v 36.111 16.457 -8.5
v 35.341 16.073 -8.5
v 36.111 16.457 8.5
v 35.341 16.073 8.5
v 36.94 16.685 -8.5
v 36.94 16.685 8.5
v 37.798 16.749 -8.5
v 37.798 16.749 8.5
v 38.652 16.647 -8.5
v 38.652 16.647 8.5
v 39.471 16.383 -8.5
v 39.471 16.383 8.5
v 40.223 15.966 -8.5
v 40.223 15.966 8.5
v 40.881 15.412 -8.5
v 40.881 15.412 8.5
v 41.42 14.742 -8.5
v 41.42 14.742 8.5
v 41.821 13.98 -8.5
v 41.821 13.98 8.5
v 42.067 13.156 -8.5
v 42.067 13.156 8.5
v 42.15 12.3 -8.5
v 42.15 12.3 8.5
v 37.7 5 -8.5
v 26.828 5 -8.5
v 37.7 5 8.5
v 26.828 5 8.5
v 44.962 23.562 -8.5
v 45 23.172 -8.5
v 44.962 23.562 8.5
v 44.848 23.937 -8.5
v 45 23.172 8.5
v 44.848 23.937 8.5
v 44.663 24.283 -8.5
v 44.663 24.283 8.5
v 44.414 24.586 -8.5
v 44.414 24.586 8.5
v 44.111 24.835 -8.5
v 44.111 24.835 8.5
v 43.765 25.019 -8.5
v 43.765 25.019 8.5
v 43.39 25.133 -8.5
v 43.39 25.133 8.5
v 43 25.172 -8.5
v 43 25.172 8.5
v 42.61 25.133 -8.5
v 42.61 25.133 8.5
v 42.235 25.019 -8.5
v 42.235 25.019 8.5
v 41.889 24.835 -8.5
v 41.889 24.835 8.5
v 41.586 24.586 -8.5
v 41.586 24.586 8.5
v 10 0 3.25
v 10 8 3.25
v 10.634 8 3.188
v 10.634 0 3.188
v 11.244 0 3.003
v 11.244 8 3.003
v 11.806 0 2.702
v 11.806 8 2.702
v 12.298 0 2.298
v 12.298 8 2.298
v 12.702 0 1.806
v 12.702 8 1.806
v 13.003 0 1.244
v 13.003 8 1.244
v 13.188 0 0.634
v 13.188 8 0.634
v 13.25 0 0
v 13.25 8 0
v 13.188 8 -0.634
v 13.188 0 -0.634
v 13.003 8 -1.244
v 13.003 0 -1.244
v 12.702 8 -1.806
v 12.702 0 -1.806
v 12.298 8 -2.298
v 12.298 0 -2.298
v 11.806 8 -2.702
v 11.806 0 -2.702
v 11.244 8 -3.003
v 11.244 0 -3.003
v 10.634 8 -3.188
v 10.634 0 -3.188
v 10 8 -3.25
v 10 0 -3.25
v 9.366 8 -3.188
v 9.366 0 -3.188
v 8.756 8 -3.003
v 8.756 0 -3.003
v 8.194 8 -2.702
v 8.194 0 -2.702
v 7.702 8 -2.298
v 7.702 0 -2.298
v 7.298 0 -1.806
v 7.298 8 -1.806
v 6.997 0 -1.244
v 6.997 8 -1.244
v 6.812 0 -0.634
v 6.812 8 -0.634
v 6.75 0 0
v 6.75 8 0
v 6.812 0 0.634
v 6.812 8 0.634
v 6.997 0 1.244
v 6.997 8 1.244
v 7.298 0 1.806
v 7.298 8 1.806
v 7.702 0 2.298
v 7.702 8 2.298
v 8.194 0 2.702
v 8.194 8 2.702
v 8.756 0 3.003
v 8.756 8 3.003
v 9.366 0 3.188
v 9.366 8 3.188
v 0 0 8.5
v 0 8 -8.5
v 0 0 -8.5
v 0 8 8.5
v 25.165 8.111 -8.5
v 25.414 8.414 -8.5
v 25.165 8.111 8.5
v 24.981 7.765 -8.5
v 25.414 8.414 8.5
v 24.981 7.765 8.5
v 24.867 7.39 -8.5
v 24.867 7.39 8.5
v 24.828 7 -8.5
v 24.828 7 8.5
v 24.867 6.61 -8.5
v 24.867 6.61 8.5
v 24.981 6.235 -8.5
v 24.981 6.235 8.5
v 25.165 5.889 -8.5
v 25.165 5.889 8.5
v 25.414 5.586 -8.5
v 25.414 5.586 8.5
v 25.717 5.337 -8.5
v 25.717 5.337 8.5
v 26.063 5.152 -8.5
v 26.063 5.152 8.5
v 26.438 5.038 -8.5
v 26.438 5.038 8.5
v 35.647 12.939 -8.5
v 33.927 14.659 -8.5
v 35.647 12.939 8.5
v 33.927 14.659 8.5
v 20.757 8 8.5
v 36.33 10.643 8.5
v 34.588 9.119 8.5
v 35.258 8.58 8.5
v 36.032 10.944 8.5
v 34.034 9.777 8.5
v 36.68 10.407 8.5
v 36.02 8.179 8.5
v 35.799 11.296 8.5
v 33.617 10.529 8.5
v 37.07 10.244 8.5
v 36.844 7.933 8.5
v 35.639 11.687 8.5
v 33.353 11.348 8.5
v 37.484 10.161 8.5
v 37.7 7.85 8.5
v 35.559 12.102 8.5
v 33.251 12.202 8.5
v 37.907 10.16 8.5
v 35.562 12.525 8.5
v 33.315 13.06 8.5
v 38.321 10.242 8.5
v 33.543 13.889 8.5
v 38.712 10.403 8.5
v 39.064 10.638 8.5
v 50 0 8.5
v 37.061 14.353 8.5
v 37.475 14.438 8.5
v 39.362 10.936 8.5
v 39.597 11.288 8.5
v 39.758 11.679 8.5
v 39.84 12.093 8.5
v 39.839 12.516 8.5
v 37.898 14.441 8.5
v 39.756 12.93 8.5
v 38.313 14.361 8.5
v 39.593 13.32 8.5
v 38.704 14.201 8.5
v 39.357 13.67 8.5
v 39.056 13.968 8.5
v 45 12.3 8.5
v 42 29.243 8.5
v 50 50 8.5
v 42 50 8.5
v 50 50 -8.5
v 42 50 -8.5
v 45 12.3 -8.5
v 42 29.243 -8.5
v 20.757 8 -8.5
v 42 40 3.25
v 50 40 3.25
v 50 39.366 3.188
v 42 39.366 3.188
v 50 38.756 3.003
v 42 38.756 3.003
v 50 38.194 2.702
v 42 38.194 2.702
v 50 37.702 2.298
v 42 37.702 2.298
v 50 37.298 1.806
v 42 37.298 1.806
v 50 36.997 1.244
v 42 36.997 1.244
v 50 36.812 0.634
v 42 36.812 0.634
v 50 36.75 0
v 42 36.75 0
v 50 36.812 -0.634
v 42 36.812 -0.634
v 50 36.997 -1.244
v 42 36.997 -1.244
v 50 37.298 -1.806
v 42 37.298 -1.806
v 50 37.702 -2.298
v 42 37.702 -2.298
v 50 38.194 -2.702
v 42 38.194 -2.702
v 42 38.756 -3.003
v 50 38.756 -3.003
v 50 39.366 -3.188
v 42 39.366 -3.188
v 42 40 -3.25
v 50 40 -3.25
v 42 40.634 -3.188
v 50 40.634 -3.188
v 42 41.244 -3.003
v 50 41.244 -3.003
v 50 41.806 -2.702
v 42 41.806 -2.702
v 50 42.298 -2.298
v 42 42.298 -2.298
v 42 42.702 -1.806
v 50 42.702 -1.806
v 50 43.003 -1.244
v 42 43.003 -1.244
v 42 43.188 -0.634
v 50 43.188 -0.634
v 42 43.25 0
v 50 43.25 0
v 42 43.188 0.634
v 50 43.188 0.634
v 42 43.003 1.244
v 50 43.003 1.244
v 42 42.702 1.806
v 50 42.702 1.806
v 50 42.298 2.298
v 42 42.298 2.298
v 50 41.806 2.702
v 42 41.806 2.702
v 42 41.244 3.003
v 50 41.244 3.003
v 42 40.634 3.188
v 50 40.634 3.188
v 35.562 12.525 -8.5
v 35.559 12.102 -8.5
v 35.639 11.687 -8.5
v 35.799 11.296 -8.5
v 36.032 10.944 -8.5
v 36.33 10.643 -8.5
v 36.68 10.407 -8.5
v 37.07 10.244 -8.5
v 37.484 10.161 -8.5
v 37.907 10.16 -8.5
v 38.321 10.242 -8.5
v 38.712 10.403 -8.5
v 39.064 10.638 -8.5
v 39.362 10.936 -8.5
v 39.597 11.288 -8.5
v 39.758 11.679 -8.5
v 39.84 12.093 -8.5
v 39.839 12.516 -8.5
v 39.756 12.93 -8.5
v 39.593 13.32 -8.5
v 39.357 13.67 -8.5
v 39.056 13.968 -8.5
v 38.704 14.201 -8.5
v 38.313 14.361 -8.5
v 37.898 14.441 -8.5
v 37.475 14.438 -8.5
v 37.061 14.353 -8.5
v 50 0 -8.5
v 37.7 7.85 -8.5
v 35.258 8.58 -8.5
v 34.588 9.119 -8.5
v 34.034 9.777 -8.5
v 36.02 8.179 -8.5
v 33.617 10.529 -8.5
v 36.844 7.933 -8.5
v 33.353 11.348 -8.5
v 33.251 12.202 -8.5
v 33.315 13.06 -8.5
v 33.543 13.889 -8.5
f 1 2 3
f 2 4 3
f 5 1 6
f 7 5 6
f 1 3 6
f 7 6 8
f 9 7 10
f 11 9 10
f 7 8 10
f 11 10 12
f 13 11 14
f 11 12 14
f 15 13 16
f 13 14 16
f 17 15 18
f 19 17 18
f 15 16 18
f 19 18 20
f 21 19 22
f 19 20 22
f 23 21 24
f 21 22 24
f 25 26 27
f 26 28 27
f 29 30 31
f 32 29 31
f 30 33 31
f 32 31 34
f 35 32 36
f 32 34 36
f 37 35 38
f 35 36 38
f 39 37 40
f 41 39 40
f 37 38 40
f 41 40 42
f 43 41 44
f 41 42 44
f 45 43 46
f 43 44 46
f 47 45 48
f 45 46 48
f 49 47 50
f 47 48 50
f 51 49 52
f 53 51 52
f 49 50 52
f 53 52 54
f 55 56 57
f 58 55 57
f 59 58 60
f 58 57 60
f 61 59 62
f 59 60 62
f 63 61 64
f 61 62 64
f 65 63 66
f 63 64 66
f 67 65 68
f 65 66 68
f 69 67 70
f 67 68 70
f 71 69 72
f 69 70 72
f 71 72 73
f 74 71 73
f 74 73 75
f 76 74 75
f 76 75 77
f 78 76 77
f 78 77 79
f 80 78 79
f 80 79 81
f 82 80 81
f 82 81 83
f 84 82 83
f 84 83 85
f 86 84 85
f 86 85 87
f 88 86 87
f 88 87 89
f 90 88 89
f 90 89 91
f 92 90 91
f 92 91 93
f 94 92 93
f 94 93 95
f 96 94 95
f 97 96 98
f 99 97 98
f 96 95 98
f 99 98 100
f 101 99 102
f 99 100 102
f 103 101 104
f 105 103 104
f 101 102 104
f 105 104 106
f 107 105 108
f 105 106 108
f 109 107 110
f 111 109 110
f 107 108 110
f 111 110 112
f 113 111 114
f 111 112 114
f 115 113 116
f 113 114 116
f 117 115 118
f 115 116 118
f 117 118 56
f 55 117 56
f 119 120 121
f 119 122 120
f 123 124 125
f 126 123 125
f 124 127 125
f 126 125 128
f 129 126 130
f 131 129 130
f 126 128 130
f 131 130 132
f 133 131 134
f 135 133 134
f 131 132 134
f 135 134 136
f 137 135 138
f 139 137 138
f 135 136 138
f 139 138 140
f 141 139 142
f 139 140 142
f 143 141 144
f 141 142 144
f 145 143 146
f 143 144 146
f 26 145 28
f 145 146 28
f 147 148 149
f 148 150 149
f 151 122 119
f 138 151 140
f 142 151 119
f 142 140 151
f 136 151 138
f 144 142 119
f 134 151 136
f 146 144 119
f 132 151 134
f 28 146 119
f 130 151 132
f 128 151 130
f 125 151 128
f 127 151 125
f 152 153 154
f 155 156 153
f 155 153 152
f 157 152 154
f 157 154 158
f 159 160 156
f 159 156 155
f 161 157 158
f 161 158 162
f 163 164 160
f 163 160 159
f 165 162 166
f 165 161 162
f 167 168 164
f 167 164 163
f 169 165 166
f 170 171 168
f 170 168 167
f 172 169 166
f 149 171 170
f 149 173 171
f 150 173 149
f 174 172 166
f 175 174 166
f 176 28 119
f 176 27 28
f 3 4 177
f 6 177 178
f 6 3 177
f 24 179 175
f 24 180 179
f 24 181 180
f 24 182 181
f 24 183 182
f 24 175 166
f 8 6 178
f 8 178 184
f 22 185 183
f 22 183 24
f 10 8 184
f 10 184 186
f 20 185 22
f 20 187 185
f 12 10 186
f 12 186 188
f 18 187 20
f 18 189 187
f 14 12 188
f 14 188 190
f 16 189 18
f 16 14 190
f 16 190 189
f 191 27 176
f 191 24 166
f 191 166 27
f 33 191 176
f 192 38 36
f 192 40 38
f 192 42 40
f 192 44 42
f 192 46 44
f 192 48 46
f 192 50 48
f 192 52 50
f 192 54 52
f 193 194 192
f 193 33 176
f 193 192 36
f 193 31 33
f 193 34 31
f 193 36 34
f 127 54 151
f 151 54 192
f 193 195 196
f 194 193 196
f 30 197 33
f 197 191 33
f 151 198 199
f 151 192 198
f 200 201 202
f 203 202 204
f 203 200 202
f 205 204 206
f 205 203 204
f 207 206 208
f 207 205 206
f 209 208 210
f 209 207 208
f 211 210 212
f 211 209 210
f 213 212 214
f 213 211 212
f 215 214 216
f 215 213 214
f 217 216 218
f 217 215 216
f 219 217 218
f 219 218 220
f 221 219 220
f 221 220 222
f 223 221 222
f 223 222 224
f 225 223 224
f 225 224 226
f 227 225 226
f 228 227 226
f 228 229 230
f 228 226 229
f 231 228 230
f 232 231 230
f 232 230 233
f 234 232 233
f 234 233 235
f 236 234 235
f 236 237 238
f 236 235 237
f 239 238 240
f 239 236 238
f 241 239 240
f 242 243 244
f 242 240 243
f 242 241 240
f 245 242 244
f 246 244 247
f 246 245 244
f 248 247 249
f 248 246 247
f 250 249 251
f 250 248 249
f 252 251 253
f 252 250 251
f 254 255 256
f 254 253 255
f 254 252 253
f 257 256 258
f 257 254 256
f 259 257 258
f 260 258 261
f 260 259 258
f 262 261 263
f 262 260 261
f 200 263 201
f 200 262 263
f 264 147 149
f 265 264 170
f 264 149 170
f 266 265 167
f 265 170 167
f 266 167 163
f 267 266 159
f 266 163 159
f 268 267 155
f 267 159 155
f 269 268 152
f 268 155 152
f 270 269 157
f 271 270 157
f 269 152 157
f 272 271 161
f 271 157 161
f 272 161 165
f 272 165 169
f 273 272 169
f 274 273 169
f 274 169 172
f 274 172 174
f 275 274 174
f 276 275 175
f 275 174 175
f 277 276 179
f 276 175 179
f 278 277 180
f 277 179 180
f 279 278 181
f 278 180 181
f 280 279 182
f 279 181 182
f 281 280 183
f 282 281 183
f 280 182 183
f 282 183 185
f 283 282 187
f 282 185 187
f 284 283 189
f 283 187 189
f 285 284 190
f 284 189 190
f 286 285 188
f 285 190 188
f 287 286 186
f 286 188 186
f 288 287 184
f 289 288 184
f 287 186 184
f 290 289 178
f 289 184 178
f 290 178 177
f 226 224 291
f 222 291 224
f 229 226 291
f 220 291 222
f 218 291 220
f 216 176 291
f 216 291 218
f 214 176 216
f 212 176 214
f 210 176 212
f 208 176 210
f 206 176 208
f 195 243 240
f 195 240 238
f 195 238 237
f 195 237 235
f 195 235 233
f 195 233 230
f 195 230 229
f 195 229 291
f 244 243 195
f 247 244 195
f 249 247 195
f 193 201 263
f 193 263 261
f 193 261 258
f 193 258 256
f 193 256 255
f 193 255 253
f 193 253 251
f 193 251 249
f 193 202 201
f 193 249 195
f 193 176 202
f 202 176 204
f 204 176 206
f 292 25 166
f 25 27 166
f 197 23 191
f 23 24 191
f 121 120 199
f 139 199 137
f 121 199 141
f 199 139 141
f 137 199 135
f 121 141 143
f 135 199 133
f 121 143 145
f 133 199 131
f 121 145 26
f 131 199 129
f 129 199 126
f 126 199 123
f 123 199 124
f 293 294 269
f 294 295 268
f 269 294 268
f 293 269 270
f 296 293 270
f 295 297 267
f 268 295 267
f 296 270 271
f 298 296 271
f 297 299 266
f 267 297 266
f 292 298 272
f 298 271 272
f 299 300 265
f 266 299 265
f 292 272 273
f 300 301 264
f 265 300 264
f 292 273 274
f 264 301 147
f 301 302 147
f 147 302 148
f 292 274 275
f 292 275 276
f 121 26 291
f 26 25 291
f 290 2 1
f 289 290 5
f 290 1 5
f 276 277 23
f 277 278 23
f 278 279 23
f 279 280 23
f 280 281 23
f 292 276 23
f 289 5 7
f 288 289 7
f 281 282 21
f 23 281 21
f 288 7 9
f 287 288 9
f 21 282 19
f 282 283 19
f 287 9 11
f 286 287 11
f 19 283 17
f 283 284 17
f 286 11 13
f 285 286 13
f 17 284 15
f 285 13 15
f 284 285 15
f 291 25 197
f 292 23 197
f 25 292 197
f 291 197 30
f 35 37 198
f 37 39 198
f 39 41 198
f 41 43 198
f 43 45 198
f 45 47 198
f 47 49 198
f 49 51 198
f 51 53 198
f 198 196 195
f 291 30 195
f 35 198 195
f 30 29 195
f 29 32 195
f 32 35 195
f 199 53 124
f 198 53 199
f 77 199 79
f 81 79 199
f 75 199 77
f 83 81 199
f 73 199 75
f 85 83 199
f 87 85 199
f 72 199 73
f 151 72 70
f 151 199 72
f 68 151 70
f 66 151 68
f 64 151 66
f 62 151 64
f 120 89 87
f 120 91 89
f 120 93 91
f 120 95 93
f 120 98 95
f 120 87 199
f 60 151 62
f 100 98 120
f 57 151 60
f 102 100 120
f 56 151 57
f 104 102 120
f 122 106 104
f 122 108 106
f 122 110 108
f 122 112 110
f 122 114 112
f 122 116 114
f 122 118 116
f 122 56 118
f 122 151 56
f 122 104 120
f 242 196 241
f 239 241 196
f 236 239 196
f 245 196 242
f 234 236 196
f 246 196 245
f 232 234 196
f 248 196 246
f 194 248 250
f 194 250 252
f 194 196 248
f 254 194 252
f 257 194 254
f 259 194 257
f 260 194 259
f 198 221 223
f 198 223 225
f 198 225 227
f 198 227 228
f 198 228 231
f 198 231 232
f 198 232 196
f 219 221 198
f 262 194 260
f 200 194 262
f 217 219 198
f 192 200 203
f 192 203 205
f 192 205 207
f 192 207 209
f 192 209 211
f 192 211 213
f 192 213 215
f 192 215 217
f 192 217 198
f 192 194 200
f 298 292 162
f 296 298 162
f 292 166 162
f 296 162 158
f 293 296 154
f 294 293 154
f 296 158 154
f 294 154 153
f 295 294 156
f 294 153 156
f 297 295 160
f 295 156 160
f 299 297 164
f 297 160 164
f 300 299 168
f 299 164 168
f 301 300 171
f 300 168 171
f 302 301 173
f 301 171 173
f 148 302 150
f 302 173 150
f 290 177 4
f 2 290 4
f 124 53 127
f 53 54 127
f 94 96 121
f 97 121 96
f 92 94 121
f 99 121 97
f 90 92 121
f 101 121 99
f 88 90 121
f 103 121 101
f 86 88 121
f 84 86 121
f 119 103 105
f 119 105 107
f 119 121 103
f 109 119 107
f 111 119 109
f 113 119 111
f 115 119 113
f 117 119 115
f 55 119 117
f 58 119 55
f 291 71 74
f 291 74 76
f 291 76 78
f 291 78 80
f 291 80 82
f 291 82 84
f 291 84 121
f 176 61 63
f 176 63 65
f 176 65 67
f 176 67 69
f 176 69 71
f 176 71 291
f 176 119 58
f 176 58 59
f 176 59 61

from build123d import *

# Parameters (mm, degrees)
EXTRUDE_1_DEPTH     = 8.5
SKETCH_3_R          = 3.25
CUT_EXTRUDE_1_DEPTH = 17


with BuildPart() as part:
    # 草图1 → 凸台-拉伸1 (new, symmetric)
    with BuildSketch(Plane.XY):
        Polygon((0, 0), (50, 0), (50, 50), (42, 50), (42, 29.242640687), (20.757359313, 8), (0, 8), align=None)
        with BuildLine():
            Line((37.061279898, 14.352933665), (35.340960992, 16.07325257))
            ThreePointArc((35.340960992, 16.07325257), (39.856939547, 16.192314452), (42.15, 12.3))
            Line((42.15, 12.3), (45, 12.3))
            Line((45, 12.3), (45, 23.171572875))
            ThreePointArc((45, 23.171572875), (43.765366865, 25.01933194), (41.585786438, 24.585786438))
            Line((41.585786438, 24.585786438), (25.414213562, 8.414213562))
            ThreePointArc((25.414213562, 8.414213562), (24.98066806, 6.234633135), (26.828427125, 5))
            Line((26.828427125, 5), (37.7, 5))
            Line((37.7, 5), (37.7, 7.85))
            ThreePointArc((37.7, 7.85), (33.807685548, 10.143060453), (33.92674743, 14.659039008))
            Line((33.92674743, 14.659039008), (35.647066335, 12.938720102))
            ThreePointArc((35.647066335, 12.938720102), (39.22027958, 10.77972042), (37.061279898, 14.352933665))
        make_face(mode=Mode.SUBTRACT)
    extrude(amount=EXTRUDE_1_DEPTH, both=True)

    # 草图3 → 切除-拉伸1 (cut)
    with BuildSketch(Plane(origin=(0, 8, 0), x_dir=(1, 0, 0), z_dir=(0, 1, 0))):
        with Locations(Location((10, 0, 0), (0, 0, 270))):
            Circle(SKETCH_3_R)
    cut_extrude_1 = extrude(amount=-CUT_EXTRUDE_1_DEPTH, mode=Mode.SUBTRACT)

    # 镜向1: 切除-拉伸1 across plane
    add(cut_extrude_1.mirror(Plane(origin=(25, 25, 0), x_dir=(0, 0, 1), z_dir=(-0.7071067811865486, -0.7071067811865465, 0))), mode=Mode.SUBTRACT)


solid = part.part
